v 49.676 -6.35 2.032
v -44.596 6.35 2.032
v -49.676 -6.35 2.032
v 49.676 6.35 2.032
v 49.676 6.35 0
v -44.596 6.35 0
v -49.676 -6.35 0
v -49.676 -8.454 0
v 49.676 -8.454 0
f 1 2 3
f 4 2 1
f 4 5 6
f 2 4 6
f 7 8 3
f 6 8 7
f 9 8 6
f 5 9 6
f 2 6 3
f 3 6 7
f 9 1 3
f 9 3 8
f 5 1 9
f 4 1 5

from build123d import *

# Parameters (mm, degrees)
F1_DEPTH = 2.032
F3_DEPTH = 99.352875


with BuildPart() as f1:
    # F0 (on Top) → F1 (new body)
    with BuildSketch(Plane.XY):
        Polygon((49.6764375, -6.35), (49.6764375, 6.35), (-44.5964375, 6.35), (-49.6764375, -6.35), align=None)
    extrude(amount=F1_DEPTH)

    # F2 (on face) → F3 (join, through all)
    with BuildSketch(Plane.YZ.offset(49.6764375)):
        Polygon((-6.35, 0), (-6.35, 2.032), (-8.4541975976, 0), align=None)
    extrude(amount=-F3_DEPTH)


solid = f1.part
